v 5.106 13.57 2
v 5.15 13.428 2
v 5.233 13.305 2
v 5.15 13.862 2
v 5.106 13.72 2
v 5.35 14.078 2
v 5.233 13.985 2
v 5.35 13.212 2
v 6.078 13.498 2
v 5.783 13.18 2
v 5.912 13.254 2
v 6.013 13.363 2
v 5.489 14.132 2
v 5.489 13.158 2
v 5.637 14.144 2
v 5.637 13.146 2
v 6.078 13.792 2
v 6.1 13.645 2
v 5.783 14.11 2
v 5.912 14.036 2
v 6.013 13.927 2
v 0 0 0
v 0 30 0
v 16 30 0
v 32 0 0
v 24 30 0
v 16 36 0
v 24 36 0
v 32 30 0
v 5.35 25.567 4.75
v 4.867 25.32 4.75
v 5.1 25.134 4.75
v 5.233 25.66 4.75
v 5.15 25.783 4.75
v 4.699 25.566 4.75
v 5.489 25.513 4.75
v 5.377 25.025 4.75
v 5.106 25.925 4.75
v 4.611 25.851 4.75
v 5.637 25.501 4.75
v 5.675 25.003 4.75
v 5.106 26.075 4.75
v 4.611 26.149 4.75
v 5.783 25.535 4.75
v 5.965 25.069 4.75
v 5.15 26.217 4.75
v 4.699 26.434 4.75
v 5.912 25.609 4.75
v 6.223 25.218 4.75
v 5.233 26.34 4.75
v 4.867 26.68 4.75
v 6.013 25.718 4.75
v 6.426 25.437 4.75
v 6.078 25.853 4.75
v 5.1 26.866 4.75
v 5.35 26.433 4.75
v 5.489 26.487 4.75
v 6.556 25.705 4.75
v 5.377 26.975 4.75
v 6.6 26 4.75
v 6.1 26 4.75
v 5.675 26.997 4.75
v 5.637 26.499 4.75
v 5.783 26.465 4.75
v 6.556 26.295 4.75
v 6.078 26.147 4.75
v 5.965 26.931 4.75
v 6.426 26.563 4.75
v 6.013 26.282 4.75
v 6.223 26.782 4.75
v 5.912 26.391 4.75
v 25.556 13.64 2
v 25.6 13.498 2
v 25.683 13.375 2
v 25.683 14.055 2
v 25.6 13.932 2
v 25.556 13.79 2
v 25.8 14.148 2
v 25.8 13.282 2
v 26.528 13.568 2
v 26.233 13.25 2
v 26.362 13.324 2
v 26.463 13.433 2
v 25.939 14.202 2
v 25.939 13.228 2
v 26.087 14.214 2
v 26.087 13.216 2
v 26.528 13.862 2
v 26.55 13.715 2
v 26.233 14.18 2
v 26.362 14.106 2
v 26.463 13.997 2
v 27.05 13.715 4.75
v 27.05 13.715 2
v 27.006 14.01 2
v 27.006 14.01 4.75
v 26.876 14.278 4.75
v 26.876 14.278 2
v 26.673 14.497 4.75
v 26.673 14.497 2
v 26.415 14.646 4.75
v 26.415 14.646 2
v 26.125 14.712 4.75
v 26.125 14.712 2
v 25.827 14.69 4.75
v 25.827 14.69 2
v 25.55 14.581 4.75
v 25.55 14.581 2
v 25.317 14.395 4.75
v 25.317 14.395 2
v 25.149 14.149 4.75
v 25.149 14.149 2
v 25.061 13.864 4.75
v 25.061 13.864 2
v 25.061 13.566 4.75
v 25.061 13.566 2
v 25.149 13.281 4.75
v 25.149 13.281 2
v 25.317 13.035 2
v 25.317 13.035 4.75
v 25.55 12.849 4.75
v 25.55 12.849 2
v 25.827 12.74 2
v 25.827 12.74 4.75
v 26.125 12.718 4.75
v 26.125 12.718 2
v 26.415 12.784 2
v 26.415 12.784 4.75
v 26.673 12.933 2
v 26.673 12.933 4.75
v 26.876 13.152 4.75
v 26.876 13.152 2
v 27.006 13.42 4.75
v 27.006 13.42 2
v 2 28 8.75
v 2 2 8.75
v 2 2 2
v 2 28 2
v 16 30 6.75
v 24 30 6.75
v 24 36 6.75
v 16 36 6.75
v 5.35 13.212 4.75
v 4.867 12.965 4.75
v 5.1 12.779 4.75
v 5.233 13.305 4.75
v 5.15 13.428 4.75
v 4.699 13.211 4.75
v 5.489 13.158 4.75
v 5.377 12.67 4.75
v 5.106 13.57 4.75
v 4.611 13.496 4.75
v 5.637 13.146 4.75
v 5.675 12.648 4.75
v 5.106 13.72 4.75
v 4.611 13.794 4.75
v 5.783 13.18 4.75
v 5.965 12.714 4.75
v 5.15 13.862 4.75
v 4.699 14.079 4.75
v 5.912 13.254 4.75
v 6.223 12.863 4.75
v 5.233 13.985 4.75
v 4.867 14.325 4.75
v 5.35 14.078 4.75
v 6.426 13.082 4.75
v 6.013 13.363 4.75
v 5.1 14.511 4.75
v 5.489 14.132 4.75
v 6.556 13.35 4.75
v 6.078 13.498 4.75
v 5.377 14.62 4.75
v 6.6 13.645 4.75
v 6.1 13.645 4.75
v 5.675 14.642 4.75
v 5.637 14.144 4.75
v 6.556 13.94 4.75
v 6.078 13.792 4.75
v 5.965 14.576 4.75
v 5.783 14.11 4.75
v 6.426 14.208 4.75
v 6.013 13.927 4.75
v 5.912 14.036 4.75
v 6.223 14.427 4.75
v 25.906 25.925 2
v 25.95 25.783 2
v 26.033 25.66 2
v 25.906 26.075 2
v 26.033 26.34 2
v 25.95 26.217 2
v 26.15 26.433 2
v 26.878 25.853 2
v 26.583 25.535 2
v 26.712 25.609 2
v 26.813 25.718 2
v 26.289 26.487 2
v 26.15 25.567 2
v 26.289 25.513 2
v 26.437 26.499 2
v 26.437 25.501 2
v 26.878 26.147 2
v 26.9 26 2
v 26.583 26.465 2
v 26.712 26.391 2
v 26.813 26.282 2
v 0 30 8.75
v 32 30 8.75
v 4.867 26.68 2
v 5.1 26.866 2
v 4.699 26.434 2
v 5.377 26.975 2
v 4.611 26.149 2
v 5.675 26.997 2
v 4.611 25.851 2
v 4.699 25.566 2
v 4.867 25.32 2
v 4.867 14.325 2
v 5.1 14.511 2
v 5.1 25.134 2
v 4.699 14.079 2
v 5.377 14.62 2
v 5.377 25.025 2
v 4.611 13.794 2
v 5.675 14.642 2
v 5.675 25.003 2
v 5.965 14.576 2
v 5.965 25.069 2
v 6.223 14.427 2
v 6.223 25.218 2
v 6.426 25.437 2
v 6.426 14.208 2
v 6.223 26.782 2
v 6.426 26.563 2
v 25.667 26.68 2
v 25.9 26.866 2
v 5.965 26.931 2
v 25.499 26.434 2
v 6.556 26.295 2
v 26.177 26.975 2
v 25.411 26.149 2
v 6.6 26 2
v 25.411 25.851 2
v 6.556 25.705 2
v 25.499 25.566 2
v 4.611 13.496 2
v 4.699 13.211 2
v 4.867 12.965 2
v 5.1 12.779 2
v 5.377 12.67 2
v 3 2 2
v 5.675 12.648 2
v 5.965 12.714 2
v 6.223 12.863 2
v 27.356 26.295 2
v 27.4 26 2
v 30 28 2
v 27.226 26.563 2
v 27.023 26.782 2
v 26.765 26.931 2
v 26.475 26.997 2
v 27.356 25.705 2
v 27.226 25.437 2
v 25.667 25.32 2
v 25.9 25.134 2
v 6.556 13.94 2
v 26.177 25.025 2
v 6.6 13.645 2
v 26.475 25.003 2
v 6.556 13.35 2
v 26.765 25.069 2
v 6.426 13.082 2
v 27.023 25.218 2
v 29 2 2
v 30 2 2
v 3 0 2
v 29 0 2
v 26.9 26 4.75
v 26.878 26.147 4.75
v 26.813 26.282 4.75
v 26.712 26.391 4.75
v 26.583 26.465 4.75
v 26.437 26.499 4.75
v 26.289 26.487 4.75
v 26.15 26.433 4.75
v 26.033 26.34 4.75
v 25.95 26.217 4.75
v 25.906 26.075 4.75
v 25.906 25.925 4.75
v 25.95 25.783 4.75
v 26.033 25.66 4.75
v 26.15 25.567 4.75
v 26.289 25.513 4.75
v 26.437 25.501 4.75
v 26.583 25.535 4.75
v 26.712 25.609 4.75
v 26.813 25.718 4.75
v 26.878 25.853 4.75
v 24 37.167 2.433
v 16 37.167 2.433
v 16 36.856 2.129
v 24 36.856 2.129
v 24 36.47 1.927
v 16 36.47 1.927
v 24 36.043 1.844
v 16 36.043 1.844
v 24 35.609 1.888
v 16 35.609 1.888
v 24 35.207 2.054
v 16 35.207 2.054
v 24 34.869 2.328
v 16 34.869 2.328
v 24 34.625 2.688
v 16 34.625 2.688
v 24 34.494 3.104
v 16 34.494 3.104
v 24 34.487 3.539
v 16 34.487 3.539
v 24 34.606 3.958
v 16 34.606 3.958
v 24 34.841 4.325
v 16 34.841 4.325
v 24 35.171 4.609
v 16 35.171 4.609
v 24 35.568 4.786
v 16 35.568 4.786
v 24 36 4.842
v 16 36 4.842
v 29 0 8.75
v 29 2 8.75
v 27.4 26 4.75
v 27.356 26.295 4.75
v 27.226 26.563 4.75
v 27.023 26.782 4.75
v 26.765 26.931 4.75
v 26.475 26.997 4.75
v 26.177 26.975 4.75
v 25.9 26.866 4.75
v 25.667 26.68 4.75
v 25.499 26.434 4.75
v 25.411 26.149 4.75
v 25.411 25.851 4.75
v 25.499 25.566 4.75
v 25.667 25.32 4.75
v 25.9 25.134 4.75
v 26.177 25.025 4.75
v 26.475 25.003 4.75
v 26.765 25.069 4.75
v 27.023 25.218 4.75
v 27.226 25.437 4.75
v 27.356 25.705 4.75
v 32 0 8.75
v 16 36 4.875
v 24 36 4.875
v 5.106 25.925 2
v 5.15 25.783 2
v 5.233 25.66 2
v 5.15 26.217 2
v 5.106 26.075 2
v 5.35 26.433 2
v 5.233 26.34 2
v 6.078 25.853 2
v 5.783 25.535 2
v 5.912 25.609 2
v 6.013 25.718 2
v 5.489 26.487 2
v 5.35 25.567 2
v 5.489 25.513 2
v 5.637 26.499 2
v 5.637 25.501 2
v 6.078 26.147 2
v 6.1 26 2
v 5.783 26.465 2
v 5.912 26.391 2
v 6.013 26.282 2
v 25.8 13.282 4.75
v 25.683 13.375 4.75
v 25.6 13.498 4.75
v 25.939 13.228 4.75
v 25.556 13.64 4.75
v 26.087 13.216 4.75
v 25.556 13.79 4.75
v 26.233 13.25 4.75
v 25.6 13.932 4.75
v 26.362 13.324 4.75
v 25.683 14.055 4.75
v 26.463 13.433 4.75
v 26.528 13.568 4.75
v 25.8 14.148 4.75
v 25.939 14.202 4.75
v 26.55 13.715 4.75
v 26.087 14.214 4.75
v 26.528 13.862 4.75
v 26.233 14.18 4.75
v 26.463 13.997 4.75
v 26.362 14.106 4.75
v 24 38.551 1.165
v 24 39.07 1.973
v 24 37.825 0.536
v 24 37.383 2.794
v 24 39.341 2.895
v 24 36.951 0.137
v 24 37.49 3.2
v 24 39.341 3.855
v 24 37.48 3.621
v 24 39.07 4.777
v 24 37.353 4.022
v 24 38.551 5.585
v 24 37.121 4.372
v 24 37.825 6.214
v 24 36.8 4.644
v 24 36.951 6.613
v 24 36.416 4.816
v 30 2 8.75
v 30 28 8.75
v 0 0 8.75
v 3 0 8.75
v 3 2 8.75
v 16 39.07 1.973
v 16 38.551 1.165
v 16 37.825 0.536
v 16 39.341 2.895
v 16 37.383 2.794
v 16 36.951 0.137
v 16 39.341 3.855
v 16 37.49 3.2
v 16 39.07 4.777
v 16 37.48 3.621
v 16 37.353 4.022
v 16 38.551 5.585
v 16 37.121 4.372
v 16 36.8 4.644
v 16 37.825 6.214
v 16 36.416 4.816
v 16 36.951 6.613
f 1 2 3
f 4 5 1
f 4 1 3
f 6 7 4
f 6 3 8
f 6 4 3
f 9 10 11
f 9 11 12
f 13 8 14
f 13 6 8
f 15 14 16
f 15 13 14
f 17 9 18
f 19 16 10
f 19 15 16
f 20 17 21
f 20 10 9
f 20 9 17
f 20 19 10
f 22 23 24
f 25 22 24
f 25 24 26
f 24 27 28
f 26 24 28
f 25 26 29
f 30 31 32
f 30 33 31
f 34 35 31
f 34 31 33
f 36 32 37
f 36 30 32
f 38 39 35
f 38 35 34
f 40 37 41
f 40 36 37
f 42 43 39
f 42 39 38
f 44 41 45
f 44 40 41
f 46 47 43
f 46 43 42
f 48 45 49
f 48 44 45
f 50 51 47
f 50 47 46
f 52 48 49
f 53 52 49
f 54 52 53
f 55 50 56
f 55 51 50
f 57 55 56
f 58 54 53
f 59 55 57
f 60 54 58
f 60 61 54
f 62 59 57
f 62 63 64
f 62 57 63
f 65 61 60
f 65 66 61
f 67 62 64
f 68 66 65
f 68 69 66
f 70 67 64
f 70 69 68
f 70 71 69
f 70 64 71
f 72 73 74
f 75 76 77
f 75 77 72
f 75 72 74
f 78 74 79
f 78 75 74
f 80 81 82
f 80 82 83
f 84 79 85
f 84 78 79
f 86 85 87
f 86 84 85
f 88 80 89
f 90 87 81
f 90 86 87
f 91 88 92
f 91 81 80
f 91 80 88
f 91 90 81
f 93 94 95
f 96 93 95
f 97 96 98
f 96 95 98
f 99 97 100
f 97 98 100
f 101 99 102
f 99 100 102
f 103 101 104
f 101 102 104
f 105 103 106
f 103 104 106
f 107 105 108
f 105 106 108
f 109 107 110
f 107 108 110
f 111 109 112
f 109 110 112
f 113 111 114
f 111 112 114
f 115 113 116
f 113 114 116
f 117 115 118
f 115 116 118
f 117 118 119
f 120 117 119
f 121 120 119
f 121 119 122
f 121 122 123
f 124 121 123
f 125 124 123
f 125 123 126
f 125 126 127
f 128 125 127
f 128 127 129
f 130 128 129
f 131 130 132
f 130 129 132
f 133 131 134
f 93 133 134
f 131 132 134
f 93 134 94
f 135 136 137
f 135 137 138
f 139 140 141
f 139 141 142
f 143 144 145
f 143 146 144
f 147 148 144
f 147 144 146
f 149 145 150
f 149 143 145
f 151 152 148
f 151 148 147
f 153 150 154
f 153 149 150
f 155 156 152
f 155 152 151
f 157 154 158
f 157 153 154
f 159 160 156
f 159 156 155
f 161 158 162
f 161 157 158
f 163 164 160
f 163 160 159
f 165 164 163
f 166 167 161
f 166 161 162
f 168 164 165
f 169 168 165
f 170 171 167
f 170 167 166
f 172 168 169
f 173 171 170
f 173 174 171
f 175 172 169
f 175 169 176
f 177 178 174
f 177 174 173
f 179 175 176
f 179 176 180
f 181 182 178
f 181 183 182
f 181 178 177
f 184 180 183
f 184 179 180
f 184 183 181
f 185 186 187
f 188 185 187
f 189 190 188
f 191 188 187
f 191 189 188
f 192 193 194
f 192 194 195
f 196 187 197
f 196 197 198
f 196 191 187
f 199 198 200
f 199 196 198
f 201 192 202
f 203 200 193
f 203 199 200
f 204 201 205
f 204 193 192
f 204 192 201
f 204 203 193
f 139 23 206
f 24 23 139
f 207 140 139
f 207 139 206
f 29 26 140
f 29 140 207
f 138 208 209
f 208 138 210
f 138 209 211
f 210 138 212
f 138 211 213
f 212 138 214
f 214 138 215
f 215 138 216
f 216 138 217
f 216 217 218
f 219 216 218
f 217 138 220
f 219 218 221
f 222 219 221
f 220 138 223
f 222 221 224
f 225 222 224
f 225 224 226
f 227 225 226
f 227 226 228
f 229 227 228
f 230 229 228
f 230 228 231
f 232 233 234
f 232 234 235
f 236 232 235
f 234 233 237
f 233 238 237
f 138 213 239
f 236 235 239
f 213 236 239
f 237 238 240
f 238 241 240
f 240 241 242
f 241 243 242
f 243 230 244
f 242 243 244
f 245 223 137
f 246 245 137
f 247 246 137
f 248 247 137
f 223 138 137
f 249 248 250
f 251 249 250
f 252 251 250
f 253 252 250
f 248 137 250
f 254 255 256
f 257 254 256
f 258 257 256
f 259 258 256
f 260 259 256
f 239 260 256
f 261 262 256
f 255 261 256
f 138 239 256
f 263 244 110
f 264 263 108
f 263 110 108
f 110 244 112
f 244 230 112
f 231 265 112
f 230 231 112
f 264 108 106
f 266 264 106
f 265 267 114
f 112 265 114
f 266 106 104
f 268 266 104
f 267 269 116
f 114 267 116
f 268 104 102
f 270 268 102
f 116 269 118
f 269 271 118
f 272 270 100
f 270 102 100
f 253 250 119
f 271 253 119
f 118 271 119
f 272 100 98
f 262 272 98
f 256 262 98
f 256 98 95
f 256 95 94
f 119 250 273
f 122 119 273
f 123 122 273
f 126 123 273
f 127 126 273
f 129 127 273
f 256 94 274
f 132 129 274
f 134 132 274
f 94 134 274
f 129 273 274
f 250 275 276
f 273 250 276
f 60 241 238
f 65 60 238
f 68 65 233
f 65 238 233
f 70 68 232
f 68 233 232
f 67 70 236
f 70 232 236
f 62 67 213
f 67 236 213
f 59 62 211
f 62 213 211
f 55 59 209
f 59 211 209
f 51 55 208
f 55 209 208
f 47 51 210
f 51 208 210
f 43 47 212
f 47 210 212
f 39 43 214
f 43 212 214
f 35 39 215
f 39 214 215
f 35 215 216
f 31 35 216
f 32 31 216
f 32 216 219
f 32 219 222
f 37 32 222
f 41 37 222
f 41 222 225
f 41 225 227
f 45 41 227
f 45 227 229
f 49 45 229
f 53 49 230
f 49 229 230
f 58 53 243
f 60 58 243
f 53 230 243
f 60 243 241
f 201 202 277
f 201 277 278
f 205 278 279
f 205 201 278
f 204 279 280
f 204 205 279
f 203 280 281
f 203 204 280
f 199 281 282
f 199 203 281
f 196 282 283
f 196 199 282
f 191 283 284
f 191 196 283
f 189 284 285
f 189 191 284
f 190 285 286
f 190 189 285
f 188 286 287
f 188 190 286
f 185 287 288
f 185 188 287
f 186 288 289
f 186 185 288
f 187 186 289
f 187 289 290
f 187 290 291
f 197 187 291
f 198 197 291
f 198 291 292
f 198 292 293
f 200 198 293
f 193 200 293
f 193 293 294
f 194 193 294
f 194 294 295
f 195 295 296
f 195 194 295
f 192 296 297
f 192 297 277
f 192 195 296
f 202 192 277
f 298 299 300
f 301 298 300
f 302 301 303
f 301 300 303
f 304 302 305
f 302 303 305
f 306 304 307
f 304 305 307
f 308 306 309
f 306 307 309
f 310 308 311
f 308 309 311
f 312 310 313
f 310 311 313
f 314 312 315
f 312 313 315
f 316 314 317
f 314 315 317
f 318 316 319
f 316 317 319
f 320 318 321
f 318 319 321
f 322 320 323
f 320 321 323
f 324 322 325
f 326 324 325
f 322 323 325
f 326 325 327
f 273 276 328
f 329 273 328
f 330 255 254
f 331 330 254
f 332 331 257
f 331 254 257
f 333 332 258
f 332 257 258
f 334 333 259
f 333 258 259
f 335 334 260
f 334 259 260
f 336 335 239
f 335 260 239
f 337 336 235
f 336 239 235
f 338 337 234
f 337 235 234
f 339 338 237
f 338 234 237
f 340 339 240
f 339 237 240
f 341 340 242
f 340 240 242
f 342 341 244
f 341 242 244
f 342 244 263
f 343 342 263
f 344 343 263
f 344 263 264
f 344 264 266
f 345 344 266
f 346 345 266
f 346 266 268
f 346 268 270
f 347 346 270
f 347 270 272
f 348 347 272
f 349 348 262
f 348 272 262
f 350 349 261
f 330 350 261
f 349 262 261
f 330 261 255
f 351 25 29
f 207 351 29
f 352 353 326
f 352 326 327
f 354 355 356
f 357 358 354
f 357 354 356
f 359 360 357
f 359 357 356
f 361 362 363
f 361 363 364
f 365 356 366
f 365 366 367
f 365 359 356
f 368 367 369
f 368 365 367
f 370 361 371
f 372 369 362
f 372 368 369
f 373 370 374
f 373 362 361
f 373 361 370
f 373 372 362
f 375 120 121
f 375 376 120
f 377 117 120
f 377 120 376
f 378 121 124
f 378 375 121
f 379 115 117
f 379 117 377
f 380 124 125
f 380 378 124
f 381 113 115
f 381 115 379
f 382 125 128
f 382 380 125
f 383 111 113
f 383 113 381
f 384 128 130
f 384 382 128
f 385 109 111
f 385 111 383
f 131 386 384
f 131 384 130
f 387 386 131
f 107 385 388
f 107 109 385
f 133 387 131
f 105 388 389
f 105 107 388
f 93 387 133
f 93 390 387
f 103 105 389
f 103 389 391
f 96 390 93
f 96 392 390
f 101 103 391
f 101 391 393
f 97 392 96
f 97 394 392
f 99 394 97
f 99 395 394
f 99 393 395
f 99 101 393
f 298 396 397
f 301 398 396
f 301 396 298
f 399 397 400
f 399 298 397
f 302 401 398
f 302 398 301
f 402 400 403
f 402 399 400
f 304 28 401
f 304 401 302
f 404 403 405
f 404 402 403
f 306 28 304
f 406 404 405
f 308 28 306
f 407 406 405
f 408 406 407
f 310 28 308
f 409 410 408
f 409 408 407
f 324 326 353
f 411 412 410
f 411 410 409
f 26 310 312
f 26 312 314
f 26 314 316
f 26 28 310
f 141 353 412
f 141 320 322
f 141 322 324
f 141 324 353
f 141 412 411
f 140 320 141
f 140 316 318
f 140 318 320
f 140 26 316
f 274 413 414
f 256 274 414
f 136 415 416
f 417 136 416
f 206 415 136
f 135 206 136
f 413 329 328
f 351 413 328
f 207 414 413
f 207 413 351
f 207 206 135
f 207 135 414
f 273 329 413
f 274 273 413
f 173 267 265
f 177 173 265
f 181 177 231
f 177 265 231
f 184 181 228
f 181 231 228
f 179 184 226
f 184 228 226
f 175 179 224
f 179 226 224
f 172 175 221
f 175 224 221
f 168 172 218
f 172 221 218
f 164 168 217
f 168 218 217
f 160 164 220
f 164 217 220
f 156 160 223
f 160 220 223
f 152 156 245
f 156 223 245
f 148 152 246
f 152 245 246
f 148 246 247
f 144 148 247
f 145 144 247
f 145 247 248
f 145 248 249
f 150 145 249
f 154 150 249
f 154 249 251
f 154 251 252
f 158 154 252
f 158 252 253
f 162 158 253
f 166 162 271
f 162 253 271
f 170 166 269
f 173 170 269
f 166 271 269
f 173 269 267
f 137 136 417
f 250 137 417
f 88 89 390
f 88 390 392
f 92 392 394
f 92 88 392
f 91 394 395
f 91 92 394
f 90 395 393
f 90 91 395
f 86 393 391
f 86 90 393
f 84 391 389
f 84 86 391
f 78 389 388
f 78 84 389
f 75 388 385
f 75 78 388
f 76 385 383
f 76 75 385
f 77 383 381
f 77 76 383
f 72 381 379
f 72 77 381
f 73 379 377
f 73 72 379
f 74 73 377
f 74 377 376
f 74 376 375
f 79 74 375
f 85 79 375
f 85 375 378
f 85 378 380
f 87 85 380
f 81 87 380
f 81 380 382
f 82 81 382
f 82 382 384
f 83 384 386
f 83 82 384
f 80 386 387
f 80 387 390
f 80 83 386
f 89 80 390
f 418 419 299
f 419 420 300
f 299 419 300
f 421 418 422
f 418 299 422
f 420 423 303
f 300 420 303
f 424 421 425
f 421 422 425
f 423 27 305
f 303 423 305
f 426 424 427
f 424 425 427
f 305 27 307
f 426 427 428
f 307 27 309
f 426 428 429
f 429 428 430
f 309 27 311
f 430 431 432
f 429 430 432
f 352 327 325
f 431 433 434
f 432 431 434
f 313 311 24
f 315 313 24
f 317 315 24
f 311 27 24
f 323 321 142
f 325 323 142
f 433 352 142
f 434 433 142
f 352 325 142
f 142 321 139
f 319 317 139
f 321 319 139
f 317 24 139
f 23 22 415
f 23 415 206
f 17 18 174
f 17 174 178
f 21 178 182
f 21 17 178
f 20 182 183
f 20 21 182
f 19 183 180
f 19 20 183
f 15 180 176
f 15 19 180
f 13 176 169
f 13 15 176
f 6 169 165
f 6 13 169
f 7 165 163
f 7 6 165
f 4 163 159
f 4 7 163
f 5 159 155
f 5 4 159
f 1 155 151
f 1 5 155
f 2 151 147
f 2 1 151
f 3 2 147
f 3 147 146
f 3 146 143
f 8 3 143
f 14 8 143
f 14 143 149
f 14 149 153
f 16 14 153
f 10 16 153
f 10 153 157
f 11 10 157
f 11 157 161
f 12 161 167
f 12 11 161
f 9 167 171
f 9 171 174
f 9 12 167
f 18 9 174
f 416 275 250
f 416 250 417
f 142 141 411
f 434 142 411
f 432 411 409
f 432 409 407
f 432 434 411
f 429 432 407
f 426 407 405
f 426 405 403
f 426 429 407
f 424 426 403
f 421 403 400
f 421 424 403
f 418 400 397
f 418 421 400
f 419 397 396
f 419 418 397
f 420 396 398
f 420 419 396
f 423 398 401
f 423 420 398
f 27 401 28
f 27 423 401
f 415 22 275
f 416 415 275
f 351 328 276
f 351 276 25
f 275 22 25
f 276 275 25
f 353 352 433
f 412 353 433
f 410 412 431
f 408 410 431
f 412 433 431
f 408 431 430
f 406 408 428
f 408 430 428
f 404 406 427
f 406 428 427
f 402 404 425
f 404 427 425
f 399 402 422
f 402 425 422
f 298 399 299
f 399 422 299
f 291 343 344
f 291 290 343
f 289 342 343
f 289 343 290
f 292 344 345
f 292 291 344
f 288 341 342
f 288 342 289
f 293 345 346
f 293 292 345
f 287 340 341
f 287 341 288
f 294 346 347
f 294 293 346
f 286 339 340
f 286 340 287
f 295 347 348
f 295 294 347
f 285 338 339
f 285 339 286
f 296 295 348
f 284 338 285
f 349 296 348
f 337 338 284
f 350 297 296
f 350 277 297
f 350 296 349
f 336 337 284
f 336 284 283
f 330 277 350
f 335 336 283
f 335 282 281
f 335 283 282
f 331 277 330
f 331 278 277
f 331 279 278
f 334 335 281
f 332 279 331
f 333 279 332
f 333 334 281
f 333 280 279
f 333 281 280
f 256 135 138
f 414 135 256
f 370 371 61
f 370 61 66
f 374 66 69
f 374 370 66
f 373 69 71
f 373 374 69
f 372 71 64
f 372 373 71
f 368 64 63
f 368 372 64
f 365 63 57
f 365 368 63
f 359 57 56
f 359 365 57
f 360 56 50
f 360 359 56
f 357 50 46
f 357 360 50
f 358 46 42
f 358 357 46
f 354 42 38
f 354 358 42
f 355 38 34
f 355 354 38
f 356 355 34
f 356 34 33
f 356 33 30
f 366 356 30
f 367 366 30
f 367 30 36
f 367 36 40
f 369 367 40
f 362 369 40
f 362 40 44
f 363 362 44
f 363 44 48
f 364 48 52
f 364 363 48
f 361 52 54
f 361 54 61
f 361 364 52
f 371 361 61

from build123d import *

# Parameters (mm, degrees)
SKETCH_W        = 32
SKETCH_H        = 30
PAD_DEPTH       = 8.75
SKETCH001_W     = 28
SKETCH001_H     = 26
POCKET_DEPTH    = 6.75
SKETCH002_R     = 1
SKETCH002_R_2   = 0.5
PAD001_DEPTH    = 2.75
SKETCH003_W     = 26
SKETCH003_H     = 6.75
POCKET001_DEPTH = 2
SKETCH004_W     = 8
SKETCH004_H     = 6.75
PAD002_DEPTH    = 6
SKETCH005_R     = 3.375
SKETCH005_R_2   = 1.5
PAD003_DEPTH    = 8
SKETCH006_R     = 1.5
POCKET002_DEPTH = 8


with BuildPart() as part:
    # Sketch → Pad (new body)
    with BuildSketch(Plane.XY):
        with Locations((16, 15)):
            Rectangle(SKETCH_W, SKETCH_H)
    extrude(amount=PAD_DEPTH)

    # Sketch001 (on Face6 of Pad) → Pocket (cut)
    with BuildSketch(Plane.XY.offset(8.75)):
        with Locations((16, 15)):
            Rectangle(SKETCH001_W, SKETCH001_H)
    extrude(amount=-POCKET_DEPTH, mode=Mode.SUBTRACT)

    # Sketch002 (on Face11 of Pocket) → Pad001 (join)
    with BuildSketch(Plane.XY.offset(2)):
        with Locations((5.6, 26)):
            Circle(SKETCH002_R)
        with Locations((5.6, 26)):
            Circle(SKETCH002_R_2, mode=Mode.SUBTRACT)
        with Locations((26.4, 26)):
            Circle(SKETCH002_R)
        with Locations((26.4, 26)):
            Circle(SKETCH002_R_2, mode=Mode.SUBTRACT)
        with Locations((26.05, 13.715)):
            Circle(SKETCH002_R)
        with Locations((26.05, 13.715)):
            Circle(SKETCH002_R_2, mode=Mode.SUBTRACT)
        with Locations((5.6, 13.645)):
            Circle(SKETCH002_R)
        with Locations((5.6, 13.645)):
            Circle(SKETCH002_R_2, mode=Mode.SUBTRACT)
    extrude(amount=PAD001_DEPTH)

    # Sketch003 (on Face1 of Pad001) → Pocket001 (cut)
    with BuildSketch(Plane.XZ):
        with Locations((16, 5.375)):
            Rectangle(SKETCH003_W, SKETCH003_H)
    extrude(amount=-POCKET001_DEPTH, mode=Mode.SUBTRACT)

    # Sketch004 (on Face9 of Pocket001) → Pad002 (join)
    with BuildSketch(Plane(origin=(0, 30, 0), x_dir=(-1, 0, 0), z_dir=(0, 1, 0))):
        with Locations((-20, 3.375)):
            Rectangle(SKETCH004_W, SKETCH004_H)
    extrude(amount=PAD002_DEPTH)

    # Sketch005 (on Face19 of Pad002) → Pad003 (join)
    with BuildSketch(Plane(origin=(16, 0, 0), x_dir=(0, -1, 0), z_dir=(-1, 0, 0))):
        with Locations((-36, 3.375)):
            Circle(SKETCH005_R)
        with Locations((-36, 3.375)):
            Circle(SKETCH005_R_2, mode=Mode.SUBTRACT)
    extrude(amount=-PAD003_DEPTH)

    # Sketch006 (on Face34 of Pad003) → Pocket002 (cut)
    with BuildSketch(Plane(origin=(16, 0, 0), x_dir=(0, -1, 0), z_dir=(-1, 0, 0))):
        with Locations((-35.974457, 3.342444)):
            Circle(SKETCH006_R)
    extrude(amount=-POCKET002_DEPTH, mode=Mode.SUBTRACT)


solid = part.part
